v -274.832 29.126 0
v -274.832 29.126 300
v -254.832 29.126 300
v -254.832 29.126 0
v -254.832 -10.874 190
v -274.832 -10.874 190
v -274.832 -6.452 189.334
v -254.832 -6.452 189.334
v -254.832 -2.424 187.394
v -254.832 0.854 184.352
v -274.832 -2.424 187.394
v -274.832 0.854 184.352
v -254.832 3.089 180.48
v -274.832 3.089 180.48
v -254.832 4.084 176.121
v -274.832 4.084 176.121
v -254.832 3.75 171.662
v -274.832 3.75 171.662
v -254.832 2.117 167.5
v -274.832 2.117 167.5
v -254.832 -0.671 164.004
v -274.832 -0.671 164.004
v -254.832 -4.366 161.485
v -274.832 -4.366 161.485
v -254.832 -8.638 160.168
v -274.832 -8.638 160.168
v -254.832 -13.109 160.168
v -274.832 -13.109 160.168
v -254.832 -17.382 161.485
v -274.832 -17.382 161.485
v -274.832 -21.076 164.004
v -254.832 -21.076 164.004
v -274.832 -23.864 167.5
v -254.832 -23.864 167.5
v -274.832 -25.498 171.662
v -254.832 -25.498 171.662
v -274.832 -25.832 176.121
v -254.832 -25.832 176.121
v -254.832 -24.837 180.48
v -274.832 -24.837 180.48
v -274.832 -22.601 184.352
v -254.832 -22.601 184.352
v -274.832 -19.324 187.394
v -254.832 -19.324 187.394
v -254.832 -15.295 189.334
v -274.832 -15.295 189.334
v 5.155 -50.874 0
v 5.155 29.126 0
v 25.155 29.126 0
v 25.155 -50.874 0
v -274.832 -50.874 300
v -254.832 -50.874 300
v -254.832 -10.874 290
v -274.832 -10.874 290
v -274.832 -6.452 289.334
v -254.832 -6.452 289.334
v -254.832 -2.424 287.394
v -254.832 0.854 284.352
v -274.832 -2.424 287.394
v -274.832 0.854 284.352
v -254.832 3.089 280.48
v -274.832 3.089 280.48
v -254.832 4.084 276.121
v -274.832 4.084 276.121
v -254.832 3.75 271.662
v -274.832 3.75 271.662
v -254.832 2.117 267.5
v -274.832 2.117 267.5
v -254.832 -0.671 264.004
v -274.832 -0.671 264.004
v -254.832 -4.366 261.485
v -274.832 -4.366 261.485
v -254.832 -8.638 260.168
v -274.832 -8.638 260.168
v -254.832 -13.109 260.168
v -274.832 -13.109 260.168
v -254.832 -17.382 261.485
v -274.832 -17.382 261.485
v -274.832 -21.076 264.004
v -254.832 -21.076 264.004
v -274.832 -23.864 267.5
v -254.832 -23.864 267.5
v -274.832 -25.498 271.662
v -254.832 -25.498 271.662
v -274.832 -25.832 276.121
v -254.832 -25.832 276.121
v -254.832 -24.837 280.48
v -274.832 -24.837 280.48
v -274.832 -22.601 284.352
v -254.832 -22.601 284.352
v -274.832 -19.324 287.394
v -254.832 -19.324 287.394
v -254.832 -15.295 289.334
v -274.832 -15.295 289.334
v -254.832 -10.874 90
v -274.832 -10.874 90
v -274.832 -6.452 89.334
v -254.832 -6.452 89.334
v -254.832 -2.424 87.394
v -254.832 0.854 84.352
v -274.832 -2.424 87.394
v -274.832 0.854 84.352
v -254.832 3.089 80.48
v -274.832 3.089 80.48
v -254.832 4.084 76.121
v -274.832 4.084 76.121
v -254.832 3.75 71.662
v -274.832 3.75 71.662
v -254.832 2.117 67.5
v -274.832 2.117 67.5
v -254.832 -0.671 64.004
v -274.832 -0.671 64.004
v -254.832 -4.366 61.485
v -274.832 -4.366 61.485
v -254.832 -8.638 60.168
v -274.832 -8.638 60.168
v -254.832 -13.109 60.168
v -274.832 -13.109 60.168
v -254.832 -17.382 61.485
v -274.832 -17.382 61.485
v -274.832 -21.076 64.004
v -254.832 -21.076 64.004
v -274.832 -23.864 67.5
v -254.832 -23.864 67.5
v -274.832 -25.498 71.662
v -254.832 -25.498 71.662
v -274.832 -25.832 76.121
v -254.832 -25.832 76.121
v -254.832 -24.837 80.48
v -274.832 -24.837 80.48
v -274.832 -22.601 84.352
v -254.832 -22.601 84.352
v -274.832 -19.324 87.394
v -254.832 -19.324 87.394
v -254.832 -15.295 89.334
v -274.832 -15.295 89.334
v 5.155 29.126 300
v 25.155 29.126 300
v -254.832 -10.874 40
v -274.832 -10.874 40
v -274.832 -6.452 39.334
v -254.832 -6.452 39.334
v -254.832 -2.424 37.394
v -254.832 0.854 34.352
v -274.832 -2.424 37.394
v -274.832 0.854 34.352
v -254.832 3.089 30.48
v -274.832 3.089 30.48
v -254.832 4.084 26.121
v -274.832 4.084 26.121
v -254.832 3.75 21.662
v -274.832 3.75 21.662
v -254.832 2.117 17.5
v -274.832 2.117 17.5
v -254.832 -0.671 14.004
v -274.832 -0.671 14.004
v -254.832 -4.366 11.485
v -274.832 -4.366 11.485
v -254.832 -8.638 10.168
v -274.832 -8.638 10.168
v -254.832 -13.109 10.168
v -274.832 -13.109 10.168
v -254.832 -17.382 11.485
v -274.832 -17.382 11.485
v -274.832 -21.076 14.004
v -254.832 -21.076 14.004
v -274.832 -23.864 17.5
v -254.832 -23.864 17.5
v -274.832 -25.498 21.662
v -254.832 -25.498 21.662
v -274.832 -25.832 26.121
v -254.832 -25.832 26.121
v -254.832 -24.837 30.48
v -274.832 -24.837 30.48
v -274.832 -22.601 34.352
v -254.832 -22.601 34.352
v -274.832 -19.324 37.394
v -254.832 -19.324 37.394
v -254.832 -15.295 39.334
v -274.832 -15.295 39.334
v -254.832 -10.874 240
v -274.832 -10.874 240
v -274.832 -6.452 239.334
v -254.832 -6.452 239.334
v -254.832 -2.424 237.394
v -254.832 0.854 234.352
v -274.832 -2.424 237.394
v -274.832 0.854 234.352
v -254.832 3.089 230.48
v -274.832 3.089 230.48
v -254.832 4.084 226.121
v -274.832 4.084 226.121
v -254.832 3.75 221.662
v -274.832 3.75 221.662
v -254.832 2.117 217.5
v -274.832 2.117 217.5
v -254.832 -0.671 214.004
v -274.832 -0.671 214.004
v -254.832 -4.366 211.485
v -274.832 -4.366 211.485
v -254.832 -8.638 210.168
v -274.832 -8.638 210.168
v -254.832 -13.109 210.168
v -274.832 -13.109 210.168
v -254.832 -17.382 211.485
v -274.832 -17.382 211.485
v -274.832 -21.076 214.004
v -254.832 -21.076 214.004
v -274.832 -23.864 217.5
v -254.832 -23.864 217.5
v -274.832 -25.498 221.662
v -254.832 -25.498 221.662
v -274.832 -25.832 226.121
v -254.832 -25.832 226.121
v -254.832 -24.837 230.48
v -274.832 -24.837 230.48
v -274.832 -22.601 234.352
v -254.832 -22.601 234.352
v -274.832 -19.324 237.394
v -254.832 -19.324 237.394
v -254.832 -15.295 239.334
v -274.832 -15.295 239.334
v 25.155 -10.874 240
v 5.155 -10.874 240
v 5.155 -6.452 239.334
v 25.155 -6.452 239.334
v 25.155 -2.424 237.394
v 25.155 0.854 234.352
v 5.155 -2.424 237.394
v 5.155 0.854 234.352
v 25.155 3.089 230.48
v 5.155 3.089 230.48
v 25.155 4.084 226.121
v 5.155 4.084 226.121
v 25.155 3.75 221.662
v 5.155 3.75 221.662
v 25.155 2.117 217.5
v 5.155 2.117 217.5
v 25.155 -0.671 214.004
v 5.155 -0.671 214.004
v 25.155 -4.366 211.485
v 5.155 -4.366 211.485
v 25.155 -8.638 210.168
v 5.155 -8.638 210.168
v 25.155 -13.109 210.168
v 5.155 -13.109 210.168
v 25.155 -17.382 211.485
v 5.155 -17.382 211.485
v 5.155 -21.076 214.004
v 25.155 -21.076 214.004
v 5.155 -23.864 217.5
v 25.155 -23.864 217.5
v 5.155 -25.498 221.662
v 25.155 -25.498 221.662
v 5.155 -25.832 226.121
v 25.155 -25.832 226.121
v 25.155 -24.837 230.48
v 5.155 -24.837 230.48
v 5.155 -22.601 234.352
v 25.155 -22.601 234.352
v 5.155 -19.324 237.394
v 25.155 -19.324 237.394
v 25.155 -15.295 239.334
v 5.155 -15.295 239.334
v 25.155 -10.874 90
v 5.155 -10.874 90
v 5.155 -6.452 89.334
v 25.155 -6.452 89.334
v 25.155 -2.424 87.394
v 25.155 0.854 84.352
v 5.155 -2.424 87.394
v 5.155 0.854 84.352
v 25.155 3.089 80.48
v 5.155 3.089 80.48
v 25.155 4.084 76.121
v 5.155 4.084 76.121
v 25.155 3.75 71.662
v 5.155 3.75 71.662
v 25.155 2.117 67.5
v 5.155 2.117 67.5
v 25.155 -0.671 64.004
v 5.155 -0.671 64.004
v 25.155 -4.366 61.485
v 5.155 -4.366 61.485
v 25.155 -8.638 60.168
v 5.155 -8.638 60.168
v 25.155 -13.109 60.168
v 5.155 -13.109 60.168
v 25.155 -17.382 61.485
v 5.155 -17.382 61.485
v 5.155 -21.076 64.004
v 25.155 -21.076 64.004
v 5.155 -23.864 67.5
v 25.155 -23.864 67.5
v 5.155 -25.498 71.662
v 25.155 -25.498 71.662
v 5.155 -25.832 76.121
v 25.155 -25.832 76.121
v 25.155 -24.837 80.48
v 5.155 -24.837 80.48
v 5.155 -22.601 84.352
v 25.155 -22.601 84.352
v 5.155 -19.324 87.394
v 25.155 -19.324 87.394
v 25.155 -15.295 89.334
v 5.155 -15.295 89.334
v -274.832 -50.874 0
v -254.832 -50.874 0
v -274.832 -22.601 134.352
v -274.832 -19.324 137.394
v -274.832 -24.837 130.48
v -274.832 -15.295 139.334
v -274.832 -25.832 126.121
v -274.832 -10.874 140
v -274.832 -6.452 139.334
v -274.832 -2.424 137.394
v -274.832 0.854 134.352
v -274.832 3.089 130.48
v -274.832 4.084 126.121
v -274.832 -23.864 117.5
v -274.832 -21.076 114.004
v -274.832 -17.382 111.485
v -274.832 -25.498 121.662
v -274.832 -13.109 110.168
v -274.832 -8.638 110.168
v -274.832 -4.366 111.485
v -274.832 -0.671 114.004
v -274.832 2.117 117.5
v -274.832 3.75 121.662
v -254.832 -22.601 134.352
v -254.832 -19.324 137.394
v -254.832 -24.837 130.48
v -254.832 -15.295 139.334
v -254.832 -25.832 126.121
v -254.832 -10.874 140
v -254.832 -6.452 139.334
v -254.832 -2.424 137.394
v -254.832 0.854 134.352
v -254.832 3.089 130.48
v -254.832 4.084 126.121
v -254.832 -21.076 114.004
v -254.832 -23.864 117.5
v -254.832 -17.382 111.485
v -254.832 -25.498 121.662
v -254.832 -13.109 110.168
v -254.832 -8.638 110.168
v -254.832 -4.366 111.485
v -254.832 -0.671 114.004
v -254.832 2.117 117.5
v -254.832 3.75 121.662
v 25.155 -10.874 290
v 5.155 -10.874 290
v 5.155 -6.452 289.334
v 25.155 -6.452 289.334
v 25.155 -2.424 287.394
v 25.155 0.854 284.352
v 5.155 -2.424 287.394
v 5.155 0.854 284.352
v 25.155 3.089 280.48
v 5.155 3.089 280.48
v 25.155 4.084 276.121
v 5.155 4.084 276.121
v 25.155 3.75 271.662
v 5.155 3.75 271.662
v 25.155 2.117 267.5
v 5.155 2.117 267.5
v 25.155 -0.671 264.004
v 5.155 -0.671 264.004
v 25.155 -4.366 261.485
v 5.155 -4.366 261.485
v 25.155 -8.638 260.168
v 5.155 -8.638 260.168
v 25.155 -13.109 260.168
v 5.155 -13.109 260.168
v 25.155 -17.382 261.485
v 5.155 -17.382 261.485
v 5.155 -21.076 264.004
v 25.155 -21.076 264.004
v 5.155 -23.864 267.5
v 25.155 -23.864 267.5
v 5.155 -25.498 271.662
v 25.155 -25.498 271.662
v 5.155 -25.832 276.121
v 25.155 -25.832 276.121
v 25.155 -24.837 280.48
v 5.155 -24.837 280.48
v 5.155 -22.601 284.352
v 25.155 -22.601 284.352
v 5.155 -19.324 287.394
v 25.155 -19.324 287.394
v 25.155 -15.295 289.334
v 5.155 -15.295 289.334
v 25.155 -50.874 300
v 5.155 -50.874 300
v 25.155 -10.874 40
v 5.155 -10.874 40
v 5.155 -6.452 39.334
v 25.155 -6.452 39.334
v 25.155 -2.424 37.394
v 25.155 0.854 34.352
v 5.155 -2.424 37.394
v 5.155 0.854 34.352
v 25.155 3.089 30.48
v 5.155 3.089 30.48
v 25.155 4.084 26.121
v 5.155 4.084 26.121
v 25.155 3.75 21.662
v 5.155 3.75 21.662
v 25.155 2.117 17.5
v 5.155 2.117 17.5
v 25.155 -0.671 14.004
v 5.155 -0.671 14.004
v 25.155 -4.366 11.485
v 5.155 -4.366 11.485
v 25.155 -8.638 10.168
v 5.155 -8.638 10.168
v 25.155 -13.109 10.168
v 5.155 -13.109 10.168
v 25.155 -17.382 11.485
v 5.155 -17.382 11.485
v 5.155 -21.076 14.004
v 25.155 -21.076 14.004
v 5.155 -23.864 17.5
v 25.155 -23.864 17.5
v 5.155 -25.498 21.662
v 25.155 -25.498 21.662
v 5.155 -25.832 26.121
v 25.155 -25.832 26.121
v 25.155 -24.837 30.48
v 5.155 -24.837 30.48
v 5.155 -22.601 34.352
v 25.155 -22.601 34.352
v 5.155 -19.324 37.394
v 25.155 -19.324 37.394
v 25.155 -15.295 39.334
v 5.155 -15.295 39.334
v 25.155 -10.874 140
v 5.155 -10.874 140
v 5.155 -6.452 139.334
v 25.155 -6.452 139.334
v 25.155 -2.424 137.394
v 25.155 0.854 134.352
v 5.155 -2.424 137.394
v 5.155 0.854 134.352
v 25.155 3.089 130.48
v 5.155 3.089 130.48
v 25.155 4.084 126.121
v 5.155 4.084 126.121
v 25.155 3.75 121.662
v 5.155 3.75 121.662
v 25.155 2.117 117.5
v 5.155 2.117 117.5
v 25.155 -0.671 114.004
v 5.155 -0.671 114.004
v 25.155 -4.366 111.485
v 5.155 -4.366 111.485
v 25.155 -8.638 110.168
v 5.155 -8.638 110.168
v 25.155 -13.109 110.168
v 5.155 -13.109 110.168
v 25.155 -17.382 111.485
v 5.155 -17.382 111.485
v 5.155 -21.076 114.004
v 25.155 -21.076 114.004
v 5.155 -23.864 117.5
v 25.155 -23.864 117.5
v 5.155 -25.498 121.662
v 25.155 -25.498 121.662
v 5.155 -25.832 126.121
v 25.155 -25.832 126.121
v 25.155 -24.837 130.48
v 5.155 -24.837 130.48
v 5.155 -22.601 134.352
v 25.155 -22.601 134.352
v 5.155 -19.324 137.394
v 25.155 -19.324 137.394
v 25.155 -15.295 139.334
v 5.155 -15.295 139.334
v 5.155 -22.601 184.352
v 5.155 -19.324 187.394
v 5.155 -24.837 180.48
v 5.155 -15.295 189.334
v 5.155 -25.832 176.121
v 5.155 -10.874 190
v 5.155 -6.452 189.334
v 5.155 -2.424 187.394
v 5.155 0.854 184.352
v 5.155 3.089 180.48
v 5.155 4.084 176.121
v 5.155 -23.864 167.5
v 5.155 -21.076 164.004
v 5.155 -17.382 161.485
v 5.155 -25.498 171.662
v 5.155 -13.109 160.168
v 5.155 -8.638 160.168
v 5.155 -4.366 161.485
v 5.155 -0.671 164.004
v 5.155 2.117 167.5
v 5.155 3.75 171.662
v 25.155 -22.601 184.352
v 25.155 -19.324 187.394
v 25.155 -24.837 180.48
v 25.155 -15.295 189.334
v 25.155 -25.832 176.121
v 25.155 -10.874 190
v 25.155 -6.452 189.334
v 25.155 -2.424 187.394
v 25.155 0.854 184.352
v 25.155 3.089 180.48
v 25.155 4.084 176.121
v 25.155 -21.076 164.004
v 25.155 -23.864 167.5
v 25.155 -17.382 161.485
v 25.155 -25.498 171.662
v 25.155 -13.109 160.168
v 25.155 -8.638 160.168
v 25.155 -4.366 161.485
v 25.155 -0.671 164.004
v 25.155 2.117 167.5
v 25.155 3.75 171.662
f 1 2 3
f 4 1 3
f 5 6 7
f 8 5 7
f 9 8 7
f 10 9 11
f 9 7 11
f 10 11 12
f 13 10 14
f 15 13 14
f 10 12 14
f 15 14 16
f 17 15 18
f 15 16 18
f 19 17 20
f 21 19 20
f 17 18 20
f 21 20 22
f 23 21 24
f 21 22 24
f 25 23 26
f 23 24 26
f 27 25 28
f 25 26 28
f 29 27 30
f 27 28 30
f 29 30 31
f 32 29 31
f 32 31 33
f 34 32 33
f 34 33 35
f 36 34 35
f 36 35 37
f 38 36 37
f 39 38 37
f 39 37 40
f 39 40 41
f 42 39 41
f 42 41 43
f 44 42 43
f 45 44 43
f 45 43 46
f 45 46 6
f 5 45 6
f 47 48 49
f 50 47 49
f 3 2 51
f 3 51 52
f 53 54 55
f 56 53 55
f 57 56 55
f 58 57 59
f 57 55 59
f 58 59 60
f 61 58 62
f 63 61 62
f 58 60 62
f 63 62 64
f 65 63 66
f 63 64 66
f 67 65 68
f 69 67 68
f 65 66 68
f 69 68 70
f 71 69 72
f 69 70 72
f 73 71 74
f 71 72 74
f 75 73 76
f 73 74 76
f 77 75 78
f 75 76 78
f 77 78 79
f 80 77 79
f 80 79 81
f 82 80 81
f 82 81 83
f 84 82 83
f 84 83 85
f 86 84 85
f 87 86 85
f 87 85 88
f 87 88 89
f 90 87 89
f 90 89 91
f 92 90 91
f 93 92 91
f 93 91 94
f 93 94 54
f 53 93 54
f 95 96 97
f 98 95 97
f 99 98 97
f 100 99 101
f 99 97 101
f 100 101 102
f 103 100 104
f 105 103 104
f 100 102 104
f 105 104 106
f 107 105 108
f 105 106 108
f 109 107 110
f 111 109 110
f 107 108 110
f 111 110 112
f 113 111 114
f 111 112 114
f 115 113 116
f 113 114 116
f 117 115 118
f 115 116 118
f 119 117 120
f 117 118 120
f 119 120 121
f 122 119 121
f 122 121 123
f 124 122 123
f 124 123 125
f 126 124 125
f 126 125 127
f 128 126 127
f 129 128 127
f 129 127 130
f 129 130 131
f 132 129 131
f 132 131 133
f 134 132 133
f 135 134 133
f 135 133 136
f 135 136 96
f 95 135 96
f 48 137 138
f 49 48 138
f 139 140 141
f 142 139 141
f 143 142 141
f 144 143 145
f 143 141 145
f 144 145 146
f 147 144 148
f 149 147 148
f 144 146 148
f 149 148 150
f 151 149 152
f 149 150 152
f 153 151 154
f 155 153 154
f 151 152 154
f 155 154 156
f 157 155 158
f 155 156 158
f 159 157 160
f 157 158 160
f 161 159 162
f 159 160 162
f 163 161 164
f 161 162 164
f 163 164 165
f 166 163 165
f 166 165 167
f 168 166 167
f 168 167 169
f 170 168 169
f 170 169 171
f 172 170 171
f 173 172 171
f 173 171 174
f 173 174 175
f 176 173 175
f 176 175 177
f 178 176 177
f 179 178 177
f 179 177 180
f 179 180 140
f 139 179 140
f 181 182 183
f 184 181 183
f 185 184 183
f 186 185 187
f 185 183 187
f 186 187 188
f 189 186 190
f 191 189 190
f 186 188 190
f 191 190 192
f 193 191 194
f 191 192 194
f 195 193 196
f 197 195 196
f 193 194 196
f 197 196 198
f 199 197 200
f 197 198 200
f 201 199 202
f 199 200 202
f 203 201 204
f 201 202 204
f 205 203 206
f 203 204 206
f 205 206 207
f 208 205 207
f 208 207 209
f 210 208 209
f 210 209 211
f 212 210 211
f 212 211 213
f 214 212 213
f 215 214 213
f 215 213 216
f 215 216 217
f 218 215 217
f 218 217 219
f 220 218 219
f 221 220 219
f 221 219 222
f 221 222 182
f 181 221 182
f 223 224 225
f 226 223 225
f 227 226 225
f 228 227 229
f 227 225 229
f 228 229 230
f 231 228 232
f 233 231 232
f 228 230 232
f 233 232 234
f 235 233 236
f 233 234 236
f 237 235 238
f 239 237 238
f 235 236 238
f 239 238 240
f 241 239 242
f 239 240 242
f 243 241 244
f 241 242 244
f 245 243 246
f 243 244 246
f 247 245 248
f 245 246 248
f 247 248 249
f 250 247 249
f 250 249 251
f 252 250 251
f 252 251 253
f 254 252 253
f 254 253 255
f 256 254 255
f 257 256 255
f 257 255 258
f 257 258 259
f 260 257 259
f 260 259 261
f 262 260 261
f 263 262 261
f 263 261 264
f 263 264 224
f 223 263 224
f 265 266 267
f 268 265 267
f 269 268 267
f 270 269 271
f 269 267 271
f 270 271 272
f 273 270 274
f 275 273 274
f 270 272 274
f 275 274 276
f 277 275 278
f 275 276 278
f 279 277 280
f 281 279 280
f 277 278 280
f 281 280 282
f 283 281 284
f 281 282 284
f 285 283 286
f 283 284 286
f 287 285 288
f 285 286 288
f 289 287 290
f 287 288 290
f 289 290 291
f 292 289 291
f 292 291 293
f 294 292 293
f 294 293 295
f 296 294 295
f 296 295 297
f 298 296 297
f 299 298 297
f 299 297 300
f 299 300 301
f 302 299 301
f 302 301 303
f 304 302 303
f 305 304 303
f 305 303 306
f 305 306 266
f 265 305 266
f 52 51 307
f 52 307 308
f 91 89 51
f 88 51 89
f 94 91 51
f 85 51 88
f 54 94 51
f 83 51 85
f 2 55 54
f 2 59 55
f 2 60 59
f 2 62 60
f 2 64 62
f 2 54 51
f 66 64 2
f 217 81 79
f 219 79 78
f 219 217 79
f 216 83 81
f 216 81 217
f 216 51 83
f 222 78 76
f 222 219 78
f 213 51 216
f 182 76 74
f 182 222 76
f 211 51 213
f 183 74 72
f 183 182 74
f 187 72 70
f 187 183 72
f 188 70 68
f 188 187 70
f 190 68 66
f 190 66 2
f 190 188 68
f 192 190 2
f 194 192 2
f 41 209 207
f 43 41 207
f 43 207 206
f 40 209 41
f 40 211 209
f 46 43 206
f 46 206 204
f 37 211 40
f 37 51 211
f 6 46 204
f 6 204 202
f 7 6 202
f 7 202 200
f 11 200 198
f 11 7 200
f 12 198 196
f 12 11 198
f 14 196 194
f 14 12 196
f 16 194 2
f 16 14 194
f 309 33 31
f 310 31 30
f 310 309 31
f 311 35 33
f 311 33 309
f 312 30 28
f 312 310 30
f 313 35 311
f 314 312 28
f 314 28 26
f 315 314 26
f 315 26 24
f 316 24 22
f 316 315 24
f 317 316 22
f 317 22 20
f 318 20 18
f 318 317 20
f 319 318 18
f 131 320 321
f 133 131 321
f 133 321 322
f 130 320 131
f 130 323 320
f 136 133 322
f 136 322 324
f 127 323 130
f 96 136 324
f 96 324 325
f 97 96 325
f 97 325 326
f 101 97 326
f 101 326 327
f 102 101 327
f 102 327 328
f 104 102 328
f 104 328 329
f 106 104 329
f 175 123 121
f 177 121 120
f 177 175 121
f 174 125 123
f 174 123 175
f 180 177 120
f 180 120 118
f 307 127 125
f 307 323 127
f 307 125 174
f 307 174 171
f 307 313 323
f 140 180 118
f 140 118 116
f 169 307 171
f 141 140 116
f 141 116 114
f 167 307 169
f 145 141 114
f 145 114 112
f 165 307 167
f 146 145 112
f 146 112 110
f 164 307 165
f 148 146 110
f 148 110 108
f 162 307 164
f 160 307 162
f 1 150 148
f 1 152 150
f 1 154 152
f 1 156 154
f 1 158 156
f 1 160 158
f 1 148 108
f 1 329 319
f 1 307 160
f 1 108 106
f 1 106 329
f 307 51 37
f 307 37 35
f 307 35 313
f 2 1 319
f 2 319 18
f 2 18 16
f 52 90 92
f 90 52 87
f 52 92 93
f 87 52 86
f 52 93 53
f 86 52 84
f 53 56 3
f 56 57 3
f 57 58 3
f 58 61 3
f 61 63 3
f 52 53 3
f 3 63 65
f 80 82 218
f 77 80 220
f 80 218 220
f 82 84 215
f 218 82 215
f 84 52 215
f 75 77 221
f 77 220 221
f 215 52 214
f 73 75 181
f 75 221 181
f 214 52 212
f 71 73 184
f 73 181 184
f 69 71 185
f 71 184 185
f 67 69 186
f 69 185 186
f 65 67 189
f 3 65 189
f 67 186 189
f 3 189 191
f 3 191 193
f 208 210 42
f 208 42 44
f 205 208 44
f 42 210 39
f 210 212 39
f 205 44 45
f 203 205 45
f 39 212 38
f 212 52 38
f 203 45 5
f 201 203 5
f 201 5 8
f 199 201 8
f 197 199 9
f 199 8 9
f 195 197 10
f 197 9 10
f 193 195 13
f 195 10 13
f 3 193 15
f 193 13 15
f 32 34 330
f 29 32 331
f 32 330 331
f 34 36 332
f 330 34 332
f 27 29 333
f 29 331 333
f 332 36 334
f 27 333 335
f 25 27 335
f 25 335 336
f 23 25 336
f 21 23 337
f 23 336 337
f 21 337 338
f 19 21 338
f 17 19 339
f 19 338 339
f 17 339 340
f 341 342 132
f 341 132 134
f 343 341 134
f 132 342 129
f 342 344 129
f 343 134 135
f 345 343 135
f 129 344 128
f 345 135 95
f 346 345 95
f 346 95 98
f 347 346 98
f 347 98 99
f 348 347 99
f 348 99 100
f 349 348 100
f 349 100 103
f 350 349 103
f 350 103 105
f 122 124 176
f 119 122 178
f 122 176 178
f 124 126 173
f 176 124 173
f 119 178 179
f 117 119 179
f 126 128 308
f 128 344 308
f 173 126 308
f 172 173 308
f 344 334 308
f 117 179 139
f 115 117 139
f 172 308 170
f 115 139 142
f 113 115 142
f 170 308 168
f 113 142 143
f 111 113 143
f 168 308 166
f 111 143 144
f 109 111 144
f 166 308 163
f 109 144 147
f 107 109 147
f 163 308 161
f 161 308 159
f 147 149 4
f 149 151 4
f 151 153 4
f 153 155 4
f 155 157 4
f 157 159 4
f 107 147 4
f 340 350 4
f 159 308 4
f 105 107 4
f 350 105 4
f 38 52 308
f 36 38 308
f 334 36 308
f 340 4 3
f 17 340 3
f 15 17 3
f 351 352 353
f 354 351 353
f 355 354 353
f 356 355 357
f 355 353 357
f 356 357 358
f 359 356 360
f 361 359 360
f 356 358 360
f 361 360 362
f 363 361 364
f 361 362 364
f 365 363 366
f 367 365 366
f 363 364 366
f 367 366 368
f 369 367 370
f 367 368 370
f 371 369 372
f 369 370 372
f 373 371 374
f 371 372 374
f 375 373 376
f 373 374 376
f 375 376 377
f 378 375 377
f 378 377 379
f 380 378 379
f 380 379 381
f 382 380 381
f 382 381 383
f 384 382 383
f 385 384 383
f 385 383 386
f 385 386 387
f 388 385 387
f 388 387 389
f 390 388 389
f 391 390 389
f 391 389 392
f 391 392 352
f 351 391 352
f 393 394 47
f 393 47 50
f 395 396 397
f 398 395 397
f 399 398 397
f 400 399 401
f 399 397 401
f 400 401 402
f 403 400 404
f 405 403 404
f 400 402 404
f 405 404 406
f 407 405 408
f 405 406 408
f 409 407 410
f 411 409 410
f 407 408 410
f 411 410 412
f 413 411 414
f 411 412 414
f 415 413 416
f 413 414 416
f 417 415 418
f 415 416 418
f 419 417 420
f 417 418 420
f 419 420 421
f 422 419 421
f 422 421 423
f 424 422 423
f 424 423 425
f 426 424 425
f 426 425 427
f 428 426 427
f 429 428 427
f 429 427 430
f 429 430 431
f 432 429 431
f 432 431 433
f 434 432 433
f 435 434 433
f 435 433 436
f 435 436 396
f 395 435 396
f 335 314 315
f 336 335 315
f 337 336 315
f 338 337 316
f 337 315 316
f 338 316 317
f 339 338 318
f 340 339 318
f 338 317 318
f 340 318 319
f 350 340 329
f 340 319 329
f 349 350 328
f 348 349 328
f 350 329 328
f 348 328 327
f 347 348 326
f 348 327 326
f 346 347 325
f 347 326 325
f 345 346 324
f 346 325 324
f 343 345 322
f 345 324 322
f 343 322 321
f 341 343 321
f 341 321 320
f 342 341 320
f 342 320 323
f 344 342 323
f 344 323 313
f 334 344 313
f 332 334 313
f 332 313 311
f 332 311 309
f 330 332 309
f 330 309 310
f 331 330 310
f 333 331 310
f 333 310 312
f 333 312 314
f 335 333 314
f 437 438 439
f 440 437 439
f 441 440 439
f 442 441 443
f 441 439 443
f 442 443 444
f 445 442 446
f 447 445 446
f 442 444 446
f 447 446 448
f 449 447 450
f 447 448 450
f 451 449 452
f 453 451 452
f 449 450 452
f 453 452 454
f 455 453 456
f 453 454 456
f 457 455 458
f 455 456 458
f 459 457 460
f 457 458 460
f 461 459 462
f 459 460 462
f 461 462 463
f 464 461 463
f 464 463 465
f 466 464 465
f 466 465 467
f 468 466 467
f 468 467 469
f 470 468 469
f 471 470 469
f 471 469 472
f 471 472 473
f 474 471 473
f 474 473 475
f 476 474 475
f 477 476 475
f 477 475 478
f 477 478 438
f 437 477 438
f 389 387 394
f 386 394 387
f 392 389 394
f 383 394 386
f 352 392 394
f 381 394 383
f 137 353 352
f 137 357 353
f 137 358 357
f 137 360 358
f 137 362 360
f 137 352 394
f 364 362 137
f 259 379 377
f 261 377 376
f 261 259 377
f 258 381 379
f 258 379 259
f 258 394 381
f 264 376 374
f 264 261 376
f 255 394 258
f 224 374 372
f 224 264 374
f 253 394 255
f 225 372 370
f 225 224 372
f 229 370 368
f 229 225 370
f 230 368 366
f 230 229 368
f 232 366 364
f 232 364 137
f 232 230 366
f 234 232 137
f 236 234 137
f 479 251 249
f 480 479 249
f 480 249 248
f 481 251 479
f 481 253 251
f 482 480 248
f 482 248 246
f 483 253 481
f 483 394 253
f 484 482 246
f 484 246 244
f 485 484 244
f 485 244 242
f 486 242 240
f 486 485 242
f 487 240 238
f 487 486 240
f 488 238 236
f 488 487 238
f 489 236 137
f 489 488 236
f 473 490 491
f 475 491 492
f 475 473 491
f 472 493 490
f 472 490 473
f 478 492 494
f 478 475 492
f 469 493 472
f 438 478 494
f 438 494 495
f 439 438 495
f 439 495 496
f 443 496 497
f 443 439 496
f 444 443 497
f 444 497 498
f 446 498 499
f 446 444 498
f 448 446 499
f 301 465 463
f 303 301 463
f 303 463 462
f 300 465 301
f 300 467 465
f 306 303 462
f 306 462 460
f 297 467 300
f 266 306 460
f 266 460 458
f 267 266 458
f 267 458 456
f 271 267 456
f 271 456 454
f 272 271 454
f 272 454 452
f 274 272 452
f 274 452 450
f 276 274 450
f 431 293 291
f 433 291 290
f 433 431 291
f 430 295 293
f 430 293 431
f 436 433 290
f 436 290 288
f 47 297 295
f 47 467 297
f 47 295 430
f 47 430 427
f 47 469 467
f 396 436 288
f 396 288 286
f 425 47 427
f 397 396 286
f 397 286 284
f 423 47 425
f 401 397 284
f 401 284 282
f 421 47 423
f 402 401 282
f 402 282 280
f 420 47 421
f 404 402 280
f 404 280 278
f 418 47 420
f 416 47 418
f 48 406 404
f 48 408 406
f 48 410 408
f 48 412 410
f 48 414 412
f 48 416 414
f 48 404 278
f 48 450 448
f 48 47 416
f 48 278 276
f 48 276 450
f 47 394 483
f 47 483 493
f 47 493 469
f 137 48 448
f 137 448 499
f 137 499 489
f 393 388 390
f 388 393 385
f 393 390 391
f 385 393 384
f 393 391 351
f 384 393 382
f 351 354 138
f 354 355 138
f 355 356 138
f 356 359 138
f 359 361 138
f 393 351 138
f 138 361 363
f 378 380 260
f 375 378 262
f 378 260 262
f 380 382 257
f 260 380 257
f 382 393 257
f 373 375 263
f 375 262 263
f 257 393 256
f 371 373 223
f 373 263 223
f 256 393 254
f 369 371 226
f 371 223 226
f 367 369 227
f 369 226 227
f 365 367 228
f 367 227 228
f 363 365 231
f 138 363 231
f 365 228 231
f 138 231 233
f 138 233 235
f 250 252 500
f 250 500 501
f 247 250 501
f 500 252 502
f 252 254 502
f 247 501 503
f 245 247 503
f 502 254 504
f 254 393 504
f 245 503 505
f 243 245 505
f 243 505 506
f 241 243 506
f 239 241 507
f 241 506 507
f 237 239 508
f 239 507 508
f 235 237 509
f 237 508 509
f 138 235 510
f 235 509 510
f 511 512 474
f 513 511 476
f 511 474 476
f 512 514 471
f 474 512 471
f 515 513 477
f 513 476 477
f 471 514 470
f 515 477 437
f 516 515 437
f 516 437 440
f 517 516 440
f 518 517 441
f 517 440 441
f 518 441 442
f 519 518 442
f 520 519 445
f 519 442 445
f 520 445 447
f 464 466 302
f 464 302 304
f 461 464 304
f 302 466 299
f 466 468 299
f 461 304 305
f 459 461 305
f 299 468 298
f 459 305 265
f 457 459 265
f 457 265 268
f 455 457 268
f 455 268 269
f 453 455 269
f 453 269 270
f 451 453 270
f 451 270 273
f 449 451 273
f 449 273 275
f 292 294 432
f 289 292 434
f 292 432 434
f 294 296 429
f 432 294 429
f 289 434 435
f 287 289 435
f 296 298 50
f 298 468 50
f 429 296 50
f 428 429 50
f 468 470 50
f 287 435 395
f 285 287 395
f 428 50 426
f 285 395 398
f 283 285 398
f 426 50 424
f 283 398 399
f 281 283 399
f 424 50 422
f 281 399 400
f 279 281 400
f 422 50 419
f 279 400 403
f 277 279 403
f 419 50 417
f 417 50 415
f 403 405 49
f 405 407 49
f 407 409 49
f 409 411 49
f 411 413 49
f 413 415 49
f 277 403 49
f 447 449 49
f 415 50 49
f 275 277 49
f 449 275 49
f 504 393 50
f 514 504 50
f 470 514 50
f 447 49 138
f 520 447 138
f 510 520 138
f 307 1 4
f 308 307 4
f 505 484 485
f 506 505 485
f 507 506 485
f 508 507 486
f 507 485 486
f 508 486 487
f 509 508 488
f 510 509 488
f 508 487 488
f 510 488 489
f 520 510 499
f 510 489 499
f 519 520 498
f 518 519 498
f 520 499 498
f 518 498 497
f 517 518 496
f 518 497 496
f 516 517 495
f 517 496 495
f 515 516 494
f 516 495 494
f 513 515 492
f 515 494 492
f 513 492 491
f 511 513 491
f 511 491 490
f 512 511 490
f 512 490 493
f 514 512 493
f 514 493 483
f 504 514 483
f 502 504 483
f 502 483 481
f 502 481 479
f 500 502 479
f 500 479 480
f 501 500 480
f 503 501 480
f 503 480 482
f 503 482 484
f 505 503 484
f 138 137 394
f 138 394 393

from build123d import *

# Parameters (mm, degrees)
SKETCH1_W             = 20
SKETCH1_H             = 80
BOSS_EXTRUDE1_DEPTH   = 300
BOSS_EXTRUDE1_2_DEPTH = 300
SKETCH2_R             = 15
CUT_EXTRUDE1_DEPTH    = 300
SKETCH3_R             = 15
CUT_EXTRUDE2_DEPTH    = 300
LPATTERN1_COUNT       = 6
LPATTERN1_PITCH       = 50


with BuildPart() as part:
    # Sketch1 → Boss-Extrude1 (new body)
    with BuildSketch(Plane.XY):
        with Locations((15.155083539, -10.873778004)):
            Rectangle(SKETCH1_W, SKETCH1_H)
    extrude(amount=BOSS_EXTRUDE1_DEPTH)


with BuildPart() as body_2:
    # Sketch1 → Boss-Extrude1 2 (new body)
    with BuildSketch(Plane.XY):
        with Locations((-264.83213886, -10.873778004)):
            Rectangle(SKETCH1_W, SKETCH1_H)
    extrude(amount=BOSS_EXTRUDE1_2_DEPTH)


with BuildPart() as cut_extrude1_tool:
    # Sketch2 → Cut-Extrude1 (new body)
    with BuildSketch(Plane.ZY.offset(274.83213886)):
        with Locations((25, -10.873778004)):
            Circle(SKETCH2_R)
    cut_extrude1 = extrude(amount=-CUT_EXTRUDE1_DEPTH)


with BuildPart() as part_1:
    add(part.part)

    # Cut-Extrude1: cut by cut_extrude1_tool
    add(cut_extrude1_tool.part, mode=Mode.SUBTRACT)


with BuildPart() as body_2_1:
    add(body_2.part)

    # Cut-Extrude1: cut by cut_extrude1_tool
    add(cut_extrude1_tool.part, mode=Mode.SUBTRACT)


with BuildPart() as cut_extrude2_tool:
    # Sketch3 → Cut-Extrude2 (new body)
    with BuildSketch(Plane.ZY.offset(274.83213886)):
        with Locations((275, -10.873778004)):
            Circle(SKETCH3_R)
    extrude(amount=-CUT_EXTRUDE2_DEPTH)


with BuildPart() as part_2:
    add(part_1.part)

    # Cut-Extrude2: cut by cut_extrude2_tool
    add(cut_extrude2_tool.part, mode=Mode.SUBTRACT)


with BuildPart() as body_2_2:
    add(body_2_1.part)

    # Cut-Extrude2: cut by cut_extrude2_tool
    add(cut_extrude2_tool.part, mode=Mode.SUBTRACT)


with BuildPart() as lpattern1_tool:
    # LPattern1: Cut-Extrude1 ×6
    with Locations(*[(0, 0, i * LPATTERN1_PITCH) for i in range(1, LPATTERN1_COUNT)]):
        add(cut_extrude1)


with BuildPart() as part_3:
    add(part_2.part)

    # LPattern1: cut by lpattern1_tool
    add(lpattern1_tool.part, mode=Mode.SUBTRACT)


with BuildPart() as body_2_3:
    add(body_2_2.part)

    # LPattern1: cut by lpattern1_tool
    add(lpattern1_tool.part, mode=Mode.SUBTRACT)


solid = Compound([part_3.part, body_2_3.part])
